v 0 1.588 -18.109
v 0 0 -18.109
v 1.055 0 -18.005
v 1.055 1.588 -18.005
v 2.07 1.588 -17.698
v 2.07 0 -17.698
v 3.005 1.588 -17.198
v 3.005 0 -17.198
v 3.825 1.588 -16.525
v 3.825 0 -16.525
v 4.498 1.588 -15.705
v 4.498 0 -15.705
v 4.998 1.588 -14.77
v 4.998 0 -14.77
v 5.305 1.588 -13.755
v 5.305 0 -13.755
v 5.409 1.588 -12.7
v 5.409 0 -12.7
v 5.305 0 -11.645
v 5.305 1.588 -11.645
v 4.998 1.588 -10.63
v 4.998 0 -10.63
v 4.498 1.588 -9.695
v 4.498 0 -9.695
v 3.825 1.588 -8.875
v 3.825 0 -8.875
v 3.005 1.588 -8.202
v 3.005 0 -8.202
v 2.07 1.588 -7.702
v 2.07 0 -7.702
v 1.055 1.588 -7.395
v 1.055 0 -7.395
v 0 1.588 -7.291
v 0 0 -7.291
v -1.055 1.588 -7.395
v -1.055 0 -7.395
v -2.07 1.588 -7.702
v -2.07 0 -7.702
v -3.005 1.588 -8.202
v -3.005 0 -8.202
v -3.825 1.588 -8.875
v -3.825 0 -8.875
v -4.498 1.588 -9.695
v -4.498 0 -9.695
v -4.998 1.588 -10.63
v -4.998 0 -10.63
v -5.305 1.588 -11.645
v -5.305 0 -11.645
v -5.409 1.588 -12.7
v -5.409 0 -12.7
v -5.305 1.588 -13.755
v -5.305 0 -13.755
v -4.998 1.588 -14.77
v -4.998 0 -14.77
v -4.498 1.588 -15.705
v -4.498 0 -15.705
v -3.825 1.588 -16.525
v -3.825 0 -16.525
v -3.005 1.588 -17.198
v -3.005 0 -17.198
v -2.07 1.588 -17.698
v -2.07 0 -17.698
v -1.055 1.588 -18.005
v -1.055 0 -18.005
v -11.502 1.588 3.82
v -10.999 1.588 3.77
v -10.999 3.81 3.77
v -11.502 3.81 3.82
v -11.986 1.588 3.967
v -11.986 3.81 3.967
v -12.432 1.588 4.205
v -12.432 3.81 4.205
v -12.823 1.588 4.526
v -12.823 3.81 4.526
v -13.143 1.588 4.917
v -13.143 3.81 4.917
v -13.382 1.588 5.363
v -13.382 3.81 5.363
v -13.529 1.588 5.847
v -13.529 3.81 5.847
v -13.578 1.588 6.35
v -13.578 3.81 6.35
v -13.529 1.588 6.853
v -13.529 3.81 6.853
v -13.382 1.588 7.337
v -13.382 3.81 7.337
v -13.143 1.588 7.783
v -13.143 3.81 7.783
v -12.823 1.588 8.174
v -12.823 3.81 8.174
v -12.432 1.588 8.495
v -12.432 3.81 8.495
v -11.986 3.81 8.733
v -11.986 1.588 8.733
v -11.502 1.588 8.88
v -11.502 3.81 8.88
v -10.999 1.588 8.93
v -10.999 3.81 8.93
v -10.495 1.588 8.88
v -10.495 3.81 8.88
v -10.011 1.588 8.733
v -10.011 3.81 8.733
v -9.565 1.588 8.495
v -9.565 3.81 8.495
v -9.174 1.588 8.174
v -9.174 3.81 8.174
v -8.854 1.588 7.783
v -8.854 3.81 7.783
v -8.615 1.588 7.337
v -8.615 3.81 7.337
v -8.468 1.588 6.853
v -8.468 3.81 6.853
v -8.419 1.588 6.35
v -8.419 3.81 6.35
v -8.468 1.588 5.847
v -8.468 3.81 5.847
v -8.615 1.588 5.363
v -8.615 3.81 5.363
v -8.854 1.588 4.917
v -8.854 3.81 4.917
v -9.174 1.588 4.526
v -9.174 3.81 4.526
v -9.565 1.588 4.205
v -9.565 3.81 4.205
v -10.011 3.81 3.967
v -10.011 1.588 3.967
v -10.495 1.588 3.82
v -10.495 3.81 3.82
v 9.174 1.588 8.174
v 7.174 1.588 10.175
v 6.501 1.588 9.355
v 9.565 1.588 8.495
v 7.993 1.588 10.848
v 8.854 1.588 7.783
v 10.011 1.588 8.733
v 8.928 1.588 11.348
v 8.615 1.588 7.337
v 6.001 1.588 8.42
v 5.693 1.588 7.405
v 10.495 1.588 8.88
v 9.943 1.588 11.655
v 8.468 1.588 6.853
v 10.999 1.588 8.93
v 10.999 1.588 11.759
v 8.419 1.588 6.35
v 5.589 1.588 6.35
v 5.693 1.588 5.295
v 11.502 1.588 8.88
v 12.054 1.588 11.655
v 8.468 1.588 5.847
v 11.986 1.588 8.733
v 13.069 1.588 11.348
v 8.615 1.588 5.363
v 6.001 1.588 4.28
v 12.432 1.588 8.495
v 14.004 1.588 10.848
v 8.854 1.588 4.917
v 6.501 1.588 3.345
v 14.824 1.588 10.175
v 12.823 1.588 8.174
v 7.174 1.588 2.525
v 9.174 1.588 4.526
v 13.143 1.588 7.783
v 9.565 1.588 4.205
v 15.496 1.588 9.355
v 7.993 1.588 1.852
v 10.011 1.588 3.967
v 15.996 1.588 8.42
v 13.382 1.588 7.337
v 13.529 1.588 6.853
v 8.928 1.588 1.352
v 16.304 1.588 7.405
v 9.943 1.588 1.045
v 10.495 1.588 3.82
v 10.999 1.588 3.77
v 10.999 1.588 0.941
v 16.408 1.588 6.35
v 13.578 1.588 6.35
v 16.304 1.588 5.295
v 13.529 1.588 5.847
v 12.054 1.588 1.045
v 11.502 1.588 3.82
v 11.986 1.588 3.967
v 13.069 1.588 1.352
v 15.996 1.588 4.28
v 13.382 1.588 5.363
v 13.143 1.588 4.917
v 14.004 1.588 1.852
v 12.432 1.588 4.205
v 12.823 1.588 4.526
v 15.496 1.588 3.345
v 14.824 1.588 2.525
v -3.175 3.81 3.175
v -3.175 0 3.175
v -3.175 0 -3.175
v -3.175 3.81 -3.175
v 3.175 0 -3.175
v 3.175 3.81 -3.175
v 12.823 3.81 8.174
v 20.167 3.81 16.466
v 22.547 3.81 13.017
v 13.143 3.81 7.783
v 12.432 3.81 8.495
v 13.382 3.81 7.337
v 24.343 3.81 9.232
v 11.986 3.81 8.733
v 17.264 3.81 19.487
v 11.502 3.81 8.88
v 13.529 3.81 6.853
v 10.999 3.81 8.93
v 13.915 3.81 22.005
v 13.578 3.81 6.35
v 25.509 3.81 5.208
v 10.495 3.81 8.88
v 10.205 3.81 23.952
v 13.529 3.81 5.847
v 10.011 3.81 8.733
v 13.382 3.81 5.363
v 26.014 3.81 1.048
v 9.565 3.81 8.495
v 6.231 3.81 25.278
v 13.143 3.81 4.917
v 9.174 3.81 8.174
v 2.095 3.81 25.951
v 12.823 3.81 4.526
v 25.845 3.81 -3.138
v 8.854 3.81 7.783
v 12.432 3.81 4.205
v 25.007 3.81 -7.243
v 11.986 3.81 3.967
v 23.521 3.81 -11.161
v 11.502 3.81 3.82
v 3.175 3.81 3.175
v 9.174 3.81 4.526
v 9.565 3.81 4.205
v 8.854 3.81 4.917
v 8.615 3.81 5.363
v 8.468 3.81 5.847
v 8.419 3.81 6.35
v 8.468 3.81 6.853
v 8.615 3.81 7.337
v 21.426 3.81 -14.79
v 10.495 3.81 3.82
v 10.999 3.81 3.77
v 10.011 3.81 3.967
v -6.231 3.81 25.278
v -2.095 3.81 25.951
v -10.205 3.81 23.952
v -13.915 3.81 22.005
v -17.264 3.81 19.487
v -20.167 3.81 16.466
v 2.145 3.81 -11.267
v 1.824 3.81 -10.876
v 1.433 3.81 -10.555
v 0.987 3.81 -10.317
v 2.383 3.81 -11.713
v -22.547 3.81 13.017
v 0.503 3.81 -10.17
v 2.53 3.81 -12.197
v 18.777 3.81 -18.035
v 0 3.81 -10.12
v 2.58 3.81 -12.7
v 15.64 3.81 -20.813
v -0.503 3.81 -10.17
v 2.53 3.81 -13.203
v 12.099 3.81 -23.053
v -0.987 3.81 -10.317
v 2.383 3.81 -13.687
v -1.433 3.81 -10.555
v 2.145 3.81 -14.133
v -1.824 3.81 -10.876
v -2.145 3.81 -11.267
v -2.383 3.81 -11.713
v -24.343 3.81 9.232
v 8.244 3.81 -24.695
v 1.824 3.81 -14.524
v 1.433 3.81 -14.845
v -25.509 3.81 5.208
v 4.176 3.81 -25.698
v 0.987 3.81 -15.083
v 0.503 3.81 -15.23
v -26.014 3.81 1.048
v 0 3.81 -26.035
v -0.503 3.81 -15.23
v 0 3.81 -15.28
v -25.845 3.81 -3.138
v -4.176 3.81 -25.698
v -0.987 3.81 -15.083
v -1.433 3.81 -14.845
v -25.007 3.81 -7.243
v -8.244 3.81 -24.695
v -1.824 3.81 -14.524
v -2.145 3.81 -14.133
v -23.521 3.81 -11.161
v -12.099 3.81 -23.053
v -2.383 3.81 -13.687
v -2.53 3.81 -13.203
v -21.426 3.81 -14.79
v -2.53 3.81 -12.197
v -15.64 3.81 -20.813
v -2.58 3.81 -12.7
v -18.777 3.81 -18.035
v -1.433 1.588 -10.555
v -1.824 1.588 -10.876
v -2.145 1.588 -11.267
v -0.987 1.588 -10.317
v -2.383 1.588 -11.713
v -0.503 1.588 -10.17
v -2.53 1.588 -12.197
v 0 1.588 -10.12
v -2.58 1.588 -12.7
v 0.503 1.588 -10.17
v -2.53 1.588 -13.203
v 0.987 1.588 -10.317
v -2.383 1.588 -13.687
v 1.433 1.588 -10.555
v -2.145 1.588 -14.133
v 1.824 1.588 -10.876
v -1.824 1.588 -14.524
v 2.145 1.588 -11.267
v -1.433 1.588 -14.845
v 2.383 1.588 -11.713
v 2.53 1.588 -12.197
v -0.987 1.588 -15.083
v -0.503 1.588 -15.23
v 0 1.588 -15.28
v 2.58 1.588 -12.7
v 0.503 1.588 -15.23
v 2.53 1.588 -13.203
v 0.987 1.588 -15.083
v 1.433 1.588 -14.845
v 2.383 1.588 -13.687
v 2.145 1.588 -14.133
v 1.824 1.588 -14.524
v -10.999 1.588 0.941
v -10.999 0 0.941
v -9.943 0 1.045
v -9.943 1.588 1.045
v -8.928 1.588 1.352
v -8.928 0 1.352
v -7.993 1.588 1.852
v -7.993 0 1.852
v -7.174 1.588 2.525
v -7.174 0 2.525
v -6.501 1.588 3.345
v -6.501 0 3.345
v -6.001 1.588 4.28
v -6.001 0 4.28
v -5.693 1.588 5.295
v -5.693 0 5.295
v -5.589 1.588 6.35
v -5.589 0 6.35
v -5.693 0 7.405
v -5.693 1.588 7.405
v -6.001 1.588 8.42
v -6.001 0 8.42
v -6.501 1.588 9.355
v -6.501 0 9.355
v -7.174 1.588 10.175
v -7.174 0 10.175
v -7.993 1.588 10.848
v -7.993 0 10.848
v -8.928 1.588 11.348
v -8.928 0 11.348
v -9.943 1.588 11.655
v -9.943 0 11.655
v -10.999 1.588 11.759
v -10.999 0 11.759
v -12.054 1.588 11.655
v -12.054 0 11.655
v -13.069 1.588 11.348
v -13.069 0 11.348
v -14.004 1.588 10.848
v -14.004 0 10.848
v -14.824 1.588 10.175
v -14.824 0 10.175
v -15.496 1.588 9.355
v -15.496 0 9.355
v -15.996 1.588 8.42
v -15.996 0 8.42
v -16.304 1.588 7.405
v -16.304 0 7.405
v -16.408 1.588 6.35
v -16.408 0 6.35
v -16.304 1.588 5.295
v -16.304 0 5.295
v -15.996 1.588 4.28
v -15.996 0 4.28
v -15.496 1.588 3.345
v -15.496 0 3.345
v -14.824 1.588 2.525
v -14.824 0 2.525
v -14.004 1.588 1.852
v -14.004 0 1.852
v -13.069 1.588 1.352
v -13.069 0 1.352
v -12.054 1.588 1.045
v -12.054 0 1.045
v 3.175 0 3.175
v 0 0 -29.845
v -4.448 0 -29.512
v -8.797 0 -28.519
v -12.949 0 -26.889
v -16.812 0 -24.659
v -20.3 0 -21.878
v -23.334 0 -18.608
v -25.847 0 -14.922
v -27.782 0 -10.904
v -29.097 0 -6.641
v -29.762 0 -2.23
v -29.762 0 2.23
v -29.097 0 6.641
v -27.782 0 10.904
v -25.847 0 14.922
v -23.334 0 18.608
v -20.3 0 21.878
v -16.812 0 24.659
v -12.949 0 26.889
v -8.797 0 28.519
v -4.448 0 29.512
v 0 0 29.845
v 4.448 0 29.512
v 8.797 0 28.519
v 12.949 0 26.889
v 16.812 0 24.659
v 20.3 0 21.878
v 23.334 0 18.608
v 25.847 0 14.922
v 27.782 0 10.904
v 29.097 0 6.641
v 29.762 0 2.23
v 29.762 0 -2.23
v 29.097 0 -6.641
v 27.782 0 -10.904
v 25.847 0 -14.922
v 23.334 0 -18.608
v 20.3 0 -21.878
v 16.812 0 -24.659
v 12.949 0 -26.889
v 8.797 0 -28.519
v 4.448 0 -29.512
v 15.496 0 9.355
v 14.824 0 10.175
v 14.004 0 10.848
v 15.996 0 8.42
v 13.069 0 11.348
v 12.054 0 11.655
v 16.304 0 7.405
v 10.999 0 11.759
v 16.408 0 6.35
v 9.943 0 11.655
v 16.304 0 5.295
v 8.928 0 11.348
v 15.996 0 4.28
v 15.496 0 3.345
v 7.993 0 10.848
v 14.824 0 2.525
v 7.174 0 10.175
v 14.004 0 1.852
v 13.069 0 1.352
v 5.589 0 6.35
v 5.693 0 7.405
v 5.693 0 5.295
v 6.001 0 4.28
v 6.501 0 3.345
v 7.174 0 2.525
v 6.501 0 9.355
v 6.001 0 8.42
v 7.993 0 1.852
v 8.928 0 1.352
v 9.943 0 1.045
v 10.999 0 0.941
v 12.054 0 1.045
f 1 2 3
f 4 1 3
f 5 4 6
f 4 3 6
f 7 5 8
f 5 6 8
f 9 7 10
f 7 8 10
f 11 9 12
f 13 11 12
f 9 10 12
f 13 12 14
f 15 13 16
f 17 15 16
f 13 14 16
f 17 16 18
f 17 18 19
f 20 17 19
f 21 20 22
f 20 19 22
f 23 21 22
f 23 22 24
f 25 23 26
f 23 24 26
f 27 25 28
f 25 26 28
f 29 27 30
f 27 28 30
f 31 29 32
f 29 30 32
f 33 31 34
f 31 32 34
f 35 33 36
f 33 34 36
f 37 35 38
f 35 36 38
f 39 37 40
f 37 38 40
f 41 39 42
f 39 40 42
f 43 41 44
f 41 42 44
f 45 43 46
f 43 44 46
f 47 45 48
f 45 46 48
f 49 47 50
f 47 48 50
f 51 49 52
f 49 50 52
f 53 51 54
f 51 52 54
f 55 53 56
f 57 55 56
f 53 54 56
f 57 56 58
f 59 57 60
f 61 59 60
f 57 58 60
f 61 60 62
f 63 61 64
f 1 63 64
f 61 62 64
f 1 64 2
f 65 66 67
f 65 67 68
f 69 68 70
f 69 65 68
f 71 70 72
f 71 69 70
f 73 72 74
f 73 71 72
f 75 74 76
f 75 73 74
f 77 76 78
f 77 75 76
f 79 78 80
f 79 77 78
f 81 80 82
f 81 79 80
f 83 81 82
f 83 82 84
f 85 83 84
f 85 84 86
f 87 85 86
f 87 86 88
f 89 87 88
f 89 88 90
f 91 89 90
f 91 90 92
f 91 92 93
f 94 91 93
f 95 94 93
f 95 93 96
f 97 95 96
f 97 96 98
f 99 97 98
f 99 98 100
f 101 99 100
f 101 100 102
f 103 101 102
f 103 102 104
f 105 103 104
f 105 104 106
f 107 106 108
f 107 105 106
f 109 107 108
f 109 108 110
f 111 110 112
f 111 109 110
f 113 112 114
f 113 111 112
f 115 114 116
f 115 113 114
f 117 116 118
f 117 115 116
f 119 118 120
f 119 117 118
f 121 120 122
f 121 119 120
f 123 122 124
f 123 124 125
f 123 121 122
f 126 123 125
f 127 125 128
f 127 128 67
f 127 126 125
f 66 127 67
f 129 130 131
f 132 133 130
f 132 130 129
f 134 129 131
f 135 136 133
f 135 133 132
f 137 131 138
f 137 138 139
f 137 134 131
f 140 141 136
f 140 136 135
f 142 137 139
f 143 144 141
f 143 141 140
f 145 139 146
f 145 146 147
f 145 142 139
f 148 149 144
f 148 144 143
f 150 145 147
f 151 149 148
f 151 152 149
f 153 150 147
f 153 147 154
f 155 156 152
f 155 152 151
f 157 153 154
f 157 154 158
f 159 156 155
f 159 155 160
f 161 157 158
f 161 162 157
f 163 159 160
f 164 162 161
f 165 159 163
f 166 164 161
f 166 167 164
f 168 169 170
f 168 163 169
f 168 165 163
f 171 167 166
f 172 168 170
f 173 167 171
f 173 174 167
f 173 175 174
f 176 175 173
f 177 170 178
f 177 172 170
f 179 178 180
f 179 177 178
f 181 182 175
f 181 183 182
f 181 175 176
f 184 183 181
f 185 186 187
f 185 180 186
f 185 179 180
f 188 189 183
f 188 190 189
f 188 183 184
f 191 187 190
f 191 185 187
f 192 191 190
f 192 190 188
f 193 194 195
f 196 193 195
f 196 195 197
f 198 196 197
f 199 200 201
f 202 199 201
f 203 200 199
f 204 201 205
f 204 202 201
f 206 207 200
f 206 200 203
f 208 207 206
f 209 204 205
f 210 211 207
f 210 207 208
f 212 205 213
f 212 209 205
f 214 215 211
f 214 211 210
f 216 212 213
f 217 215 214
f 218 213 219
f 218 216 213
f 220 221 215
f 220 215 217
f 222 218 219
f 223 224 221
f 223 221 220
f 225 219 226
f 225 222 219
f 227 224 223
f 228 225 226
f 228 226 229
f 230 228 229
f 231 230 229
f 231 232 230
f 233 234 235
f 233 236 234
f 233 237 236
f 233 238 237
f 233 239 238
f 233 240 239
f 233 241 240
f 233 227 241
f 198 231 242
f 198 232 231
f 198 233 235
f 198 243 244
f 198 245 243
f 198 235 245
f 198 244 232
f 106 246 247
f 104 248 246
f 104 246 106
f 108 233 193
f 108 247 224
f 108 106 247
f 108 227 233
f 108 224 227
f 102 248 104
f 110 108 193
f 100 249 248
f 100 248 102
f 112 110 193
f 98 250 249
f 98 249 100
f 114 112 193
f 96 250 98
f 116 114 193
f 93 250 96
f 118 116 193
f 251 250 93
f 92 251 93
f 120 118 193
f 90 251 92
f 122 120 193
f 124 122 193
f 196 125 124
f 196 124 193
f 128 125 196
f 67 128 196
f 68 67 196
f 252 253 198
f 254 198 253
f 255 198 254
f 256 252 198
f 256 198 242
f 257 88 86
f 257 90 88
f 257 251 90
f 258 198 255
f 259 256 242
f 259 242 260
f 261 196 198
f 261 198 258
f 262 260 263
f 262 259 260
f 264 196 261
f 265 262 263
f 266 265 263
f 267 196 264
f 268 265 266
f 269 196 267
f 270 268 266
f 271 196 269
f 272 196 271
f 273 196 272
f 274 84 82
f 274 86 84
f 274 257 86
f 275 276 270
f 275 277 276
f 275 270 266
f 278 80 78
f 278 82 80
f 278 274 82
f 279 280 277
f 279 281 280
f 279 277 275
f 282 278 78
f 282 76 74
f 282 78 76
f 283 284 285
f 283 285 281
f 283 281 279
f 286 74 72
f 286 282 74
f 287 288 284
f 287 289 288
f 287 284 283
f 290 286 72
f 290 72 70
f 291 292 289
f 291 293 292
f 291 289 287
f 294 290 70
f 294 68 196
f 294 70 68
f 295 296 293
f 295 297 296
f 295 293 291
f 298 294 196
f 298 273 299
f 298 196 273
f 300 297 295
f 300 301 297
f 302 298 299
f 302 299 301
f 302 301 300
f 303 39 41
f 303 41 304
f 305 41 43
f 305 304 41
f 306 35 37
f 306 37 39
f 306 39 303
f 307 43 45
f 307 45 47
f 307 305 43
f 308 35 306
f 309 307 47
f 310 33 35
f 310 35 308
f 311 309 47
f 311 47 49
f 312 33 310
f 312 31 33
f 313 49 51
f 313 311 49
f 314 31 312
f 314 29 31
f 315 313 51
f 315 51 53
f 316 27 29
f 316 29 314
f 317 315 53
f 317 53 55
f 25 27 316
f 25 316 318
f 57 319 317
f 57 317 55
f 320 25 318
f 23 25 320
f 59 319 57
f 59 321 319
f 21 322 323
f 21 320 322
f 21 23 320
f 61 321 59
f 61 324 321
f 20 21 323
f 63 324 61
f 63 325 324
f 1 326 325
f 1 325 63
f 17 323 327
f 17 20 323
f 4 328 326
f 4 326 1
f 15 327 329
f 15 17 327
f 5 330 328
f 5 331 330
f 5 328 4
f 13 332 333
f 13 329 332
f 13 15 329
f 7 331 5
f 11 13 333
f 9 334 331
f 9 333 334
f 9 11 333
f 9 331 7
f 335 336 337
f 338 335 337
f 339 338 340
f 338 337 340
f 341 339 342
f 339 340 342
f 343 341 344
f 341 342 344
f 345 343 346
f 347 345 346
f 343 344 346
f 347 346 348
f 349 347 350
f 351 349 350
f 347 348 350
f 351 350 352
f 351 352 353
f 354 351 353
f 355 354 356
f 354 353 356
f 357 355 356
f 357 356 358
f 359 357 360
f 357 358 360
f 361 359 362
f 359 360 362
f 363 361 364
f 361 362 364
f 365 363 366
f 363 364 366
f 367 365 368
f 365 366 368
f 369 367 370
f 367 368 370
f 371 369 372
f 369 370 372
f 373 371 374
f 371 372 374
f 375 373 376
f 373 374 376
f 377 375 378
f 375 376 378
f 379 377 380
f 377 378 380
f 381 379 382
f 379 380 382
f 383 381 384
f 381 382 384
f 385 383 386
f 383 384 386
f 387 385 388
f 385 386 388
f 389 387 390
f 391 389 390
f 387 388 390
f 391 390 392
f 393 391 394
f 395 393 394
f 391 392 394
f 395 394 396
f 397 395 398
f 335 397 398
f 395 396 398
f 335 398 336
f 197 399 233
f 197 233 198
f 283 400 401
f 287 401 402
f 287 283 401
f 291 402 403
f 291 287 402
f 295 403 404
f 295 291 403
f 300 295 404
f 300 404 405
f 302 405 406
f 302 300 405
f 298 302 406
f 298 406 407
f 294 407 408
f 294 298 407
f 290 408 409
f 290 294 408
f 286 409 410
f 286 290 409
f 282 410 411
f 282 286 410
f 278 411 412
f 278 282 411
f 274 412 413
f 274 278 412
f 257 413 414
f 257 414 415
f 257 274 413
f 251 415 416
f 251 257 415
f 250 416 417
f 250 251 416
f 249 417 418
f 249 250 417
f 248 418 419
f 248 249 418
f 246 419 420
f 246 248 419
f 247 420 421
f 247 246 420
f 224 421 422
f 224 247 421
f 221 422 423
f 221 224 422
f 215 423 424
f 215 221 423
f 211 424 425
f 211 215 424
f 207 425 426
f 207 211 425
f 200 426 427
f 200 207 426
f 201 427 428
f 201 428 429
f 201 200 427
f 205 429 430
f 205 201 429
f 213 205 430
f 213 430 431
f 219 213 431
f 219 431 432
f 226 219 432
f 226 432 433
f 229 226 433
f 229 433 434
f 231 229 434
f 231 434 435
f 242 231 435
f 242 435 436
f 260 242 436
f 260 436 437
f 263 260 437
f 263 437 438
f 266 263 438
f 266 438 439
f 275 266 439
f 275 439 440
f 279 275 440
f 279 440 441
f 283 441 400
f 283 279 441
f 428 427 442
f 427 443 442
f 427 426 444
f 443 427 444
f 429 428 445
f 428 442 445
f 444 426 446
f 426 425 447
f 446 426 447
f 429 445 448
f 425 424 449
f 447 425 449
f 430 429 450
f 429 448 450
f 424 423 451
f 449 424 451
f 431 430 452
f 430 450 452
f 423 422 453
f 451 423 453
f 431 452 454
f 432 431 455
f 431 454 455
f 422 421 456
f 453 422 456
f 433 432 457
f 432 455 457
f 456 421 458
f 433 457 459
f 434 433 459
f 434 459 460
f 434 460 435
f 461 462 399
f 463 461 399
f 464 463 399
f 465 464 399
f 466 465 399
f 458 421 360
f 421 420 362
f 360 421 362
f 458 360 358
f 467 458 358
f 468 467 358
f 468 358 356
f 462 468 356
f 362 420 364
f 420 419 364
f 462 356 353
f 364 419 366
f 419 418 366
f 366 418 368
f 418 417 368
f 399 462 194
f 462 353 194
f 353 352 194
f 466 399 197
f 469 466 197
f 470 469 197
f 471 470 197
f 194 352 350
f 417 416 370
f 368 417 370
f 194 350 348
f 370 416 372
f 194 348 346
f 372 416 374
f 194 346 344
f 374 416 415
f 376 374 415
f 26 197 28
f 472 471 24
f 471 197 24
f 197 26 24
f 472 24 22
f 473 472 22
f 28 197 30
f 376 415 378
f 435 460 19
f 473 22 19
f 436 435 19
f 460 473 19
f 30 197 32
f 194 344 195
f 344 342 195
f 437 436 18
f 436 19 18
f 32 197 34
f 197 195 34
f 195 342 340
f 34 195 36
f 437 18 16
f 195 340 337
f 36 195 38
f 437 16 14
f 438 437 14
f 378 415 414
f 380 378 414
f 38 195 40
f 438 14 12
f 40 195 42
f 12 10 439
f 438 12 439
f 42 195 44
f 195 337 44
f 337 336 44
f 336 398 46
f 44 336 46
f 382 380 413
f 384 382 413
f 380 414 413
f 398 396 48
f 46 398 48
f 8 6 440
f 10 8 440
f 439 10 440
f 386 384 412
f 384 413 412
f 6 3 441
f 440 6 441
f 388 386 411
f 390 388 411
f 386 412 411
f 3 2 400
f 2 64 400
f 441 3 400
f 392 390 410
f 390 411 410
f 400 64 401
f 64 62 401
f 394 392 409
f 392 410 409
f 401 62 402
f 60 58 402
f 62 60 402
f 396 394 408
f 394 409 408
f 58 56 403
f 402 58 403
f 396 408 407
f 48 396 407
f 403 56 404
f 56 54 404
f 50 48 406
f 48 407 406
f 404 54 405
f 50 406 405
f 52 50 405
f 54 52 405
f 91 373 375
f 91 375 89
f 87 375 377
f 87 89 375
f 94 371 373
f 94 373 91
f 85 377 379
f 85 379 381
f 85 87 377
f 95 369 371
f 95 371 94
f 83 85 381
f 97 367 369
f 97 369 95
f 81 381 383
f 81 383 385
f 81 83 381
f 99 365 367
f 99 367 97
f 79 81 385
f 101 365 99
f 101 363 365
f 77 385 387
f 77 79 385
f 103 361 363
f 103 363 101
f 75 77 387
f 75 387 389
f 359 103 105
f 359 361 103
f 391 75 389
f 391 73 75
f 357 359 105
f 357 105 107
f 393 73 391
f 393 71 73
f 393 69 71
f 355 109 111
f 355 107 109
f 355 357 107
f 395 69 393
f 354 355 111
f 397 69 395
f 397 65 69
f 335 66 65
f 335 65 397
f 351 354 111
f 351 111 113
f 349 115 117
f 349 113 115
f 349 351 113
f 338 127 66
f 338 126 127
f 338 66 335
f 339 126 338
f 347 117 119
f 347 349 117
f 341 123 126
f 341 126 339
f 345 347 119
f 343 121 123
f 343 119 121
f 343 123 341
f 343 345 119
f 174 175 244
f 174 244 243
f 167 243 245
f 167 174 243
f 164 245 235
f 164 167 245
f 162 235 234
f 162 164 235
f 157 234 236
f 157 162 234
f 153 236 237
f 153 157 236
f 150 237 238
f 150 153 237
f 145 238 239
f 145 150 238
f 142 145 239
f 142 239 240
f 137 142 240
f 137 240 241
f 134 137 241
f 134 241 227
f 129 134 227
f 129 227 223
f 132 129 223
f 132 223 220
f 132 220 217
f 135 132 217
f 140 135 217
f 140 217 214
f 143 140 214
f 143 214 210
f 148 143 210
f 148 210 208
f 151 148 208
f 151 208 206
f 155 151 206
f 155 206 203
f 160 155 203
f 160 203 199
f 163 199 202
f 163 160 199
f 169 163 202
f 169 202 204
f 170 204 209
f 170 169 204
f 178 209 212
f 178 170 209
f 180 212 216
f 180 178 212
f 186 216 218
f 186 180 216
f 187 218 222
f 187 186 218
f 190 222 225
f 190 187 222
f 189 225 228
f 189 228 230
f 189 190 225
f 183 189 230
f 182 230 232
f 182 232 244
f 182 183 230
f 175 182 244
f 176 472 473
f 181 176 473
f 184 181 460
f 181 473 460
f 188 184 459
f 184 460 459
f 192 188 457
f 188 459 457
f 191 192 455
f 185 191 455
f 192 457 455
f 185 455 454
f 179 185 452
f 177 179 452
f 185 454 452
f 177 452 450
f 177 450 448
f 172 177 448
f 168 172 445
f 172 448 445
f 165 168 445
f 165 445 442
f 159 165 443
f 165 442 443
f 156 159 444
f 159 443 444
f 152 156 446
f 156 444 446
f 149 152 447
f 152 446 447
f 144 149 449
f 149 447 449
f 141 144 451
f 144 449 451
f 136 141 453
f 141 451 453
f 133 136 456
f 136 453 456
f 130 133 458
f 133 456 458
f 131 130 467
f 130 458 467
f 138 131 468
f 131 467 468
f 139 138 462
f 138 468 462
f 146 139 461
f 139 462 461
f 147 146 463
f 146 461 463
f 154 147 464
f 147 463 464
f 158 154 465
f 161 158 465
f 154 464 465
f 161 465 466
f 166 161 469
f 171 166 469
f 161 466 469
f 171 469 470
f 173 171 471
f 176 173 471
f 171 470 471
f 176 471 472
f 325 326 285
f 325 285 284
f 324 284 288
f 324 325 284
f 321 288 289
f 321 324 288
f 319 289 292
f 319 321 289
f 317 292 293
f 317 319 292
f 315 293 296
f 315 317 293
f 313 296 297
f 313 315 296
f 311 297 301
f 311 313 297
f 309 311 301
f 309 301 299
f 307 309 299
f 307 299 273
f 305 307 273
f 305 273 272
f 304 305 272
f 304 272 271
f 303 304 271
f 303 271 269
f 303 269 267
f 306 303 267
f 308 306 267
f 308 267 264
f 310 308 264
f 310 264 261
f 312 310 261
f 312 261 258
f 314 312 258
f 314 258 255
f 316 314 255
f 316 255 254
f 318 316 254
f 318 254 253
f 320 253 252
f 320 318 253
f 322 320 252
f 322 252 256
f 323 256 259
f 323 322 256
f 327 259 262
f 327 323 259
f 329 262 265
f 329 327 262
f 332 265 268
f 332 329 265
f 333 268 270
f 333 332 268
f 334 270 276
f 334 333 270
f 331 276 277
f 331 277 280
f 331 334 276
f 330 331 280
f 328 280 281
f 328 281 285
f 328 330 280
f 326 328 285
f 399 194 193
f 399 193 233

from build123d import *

# Parameters (mm, degrees)
SKETCH1_R           = 31.75
SKETCH1_R_2         = 2.5796875
SKETCH1_W           = 6.35
SKETCH1_H           = 6.35
BOSS_EXTRUDE1_DEPTH = 3.81
CHAMFER1_SIZE       = 5.715
SKETCH2_R           = 5.409375008
CUT_EXTRUDE1_DEPTH  = 1.5875


with BuildPart() as part:
    # Sketch1 → Boss-Extrude1 (new body)
    with BuildSketch(Plane(origin=(0, 0, 0), x_dir=(1, 0, 0), z_dir=(0, 1, 0))):
        with Locations(Location((0, 0, 0), (0, 0, 90))):
            Circle(SKETCH1_R)
        with Locations(Location((0, 12.7, 0), (0, 0, 90))):
            Circle(SKETCH1_R_2, mode=Mode.SUBTRACT)
        with Locations(Location((10.998522628, -6.35, 0), (0, 0, 90))):
            Circle(SKETCH1_R_2, mode=Mode.SUBTRACT)
        with Locations(Location((-10.998522628, -6.35, 0), (0, 0, 90))):
            Circle(SKETCH1_R_2, mode=Mode.SUBTRACT)
        Rectangle(SKETCH1_W, SKETCH1_H, mode=Mode.SUBTRACT)
    extrude(amount=BOSS_EXTRUDE1_DEPTH)

    # Chamfer1
    # the kernel refuses this chamfer: 5.715 mm, written as the material it takes off along each edge
    with BuildSketch(Plane(origin=(0, 3.81, 0), x_dir=(0, 0, -1), z_dir=(1, 0, 0))) as chamfer1_piece_1:
        Polygon((31.75, -CHAMFER1_SIZE), (31.75 - CHAMFER1_SIZE, 0), (31.75, 0), align=None)
    revolve(axis=Axis((0, 3.81, 0), (0, 1, 0)), mode=Mode.SUBTRACT)

    # Sketch2 → Cut-Extrude1 (cut)
    with BuildSketch(Plane(origin=(0, 0, 0), x_dir=(-1, 0, 0), z_dir=(0, -1, 0))):
        with Locations(Location((0, 12.7, 0), (0, 0, 90))):
            Circle(SKETCH2_R)
        with Locations(Location((10.998522628, -6.35, 0), (0, 0, 90))):
            Circle(SKETCH2_R)
        with Locations(Location((-10.998522628, -6.35, 0), (0, 0, 90))):
            Circle(SKETCH2_R)
    extrude(amount=-CUT_EXTRUDE1_DEPTH, mode=Mode.SUBTRACT)


solid = part.part
